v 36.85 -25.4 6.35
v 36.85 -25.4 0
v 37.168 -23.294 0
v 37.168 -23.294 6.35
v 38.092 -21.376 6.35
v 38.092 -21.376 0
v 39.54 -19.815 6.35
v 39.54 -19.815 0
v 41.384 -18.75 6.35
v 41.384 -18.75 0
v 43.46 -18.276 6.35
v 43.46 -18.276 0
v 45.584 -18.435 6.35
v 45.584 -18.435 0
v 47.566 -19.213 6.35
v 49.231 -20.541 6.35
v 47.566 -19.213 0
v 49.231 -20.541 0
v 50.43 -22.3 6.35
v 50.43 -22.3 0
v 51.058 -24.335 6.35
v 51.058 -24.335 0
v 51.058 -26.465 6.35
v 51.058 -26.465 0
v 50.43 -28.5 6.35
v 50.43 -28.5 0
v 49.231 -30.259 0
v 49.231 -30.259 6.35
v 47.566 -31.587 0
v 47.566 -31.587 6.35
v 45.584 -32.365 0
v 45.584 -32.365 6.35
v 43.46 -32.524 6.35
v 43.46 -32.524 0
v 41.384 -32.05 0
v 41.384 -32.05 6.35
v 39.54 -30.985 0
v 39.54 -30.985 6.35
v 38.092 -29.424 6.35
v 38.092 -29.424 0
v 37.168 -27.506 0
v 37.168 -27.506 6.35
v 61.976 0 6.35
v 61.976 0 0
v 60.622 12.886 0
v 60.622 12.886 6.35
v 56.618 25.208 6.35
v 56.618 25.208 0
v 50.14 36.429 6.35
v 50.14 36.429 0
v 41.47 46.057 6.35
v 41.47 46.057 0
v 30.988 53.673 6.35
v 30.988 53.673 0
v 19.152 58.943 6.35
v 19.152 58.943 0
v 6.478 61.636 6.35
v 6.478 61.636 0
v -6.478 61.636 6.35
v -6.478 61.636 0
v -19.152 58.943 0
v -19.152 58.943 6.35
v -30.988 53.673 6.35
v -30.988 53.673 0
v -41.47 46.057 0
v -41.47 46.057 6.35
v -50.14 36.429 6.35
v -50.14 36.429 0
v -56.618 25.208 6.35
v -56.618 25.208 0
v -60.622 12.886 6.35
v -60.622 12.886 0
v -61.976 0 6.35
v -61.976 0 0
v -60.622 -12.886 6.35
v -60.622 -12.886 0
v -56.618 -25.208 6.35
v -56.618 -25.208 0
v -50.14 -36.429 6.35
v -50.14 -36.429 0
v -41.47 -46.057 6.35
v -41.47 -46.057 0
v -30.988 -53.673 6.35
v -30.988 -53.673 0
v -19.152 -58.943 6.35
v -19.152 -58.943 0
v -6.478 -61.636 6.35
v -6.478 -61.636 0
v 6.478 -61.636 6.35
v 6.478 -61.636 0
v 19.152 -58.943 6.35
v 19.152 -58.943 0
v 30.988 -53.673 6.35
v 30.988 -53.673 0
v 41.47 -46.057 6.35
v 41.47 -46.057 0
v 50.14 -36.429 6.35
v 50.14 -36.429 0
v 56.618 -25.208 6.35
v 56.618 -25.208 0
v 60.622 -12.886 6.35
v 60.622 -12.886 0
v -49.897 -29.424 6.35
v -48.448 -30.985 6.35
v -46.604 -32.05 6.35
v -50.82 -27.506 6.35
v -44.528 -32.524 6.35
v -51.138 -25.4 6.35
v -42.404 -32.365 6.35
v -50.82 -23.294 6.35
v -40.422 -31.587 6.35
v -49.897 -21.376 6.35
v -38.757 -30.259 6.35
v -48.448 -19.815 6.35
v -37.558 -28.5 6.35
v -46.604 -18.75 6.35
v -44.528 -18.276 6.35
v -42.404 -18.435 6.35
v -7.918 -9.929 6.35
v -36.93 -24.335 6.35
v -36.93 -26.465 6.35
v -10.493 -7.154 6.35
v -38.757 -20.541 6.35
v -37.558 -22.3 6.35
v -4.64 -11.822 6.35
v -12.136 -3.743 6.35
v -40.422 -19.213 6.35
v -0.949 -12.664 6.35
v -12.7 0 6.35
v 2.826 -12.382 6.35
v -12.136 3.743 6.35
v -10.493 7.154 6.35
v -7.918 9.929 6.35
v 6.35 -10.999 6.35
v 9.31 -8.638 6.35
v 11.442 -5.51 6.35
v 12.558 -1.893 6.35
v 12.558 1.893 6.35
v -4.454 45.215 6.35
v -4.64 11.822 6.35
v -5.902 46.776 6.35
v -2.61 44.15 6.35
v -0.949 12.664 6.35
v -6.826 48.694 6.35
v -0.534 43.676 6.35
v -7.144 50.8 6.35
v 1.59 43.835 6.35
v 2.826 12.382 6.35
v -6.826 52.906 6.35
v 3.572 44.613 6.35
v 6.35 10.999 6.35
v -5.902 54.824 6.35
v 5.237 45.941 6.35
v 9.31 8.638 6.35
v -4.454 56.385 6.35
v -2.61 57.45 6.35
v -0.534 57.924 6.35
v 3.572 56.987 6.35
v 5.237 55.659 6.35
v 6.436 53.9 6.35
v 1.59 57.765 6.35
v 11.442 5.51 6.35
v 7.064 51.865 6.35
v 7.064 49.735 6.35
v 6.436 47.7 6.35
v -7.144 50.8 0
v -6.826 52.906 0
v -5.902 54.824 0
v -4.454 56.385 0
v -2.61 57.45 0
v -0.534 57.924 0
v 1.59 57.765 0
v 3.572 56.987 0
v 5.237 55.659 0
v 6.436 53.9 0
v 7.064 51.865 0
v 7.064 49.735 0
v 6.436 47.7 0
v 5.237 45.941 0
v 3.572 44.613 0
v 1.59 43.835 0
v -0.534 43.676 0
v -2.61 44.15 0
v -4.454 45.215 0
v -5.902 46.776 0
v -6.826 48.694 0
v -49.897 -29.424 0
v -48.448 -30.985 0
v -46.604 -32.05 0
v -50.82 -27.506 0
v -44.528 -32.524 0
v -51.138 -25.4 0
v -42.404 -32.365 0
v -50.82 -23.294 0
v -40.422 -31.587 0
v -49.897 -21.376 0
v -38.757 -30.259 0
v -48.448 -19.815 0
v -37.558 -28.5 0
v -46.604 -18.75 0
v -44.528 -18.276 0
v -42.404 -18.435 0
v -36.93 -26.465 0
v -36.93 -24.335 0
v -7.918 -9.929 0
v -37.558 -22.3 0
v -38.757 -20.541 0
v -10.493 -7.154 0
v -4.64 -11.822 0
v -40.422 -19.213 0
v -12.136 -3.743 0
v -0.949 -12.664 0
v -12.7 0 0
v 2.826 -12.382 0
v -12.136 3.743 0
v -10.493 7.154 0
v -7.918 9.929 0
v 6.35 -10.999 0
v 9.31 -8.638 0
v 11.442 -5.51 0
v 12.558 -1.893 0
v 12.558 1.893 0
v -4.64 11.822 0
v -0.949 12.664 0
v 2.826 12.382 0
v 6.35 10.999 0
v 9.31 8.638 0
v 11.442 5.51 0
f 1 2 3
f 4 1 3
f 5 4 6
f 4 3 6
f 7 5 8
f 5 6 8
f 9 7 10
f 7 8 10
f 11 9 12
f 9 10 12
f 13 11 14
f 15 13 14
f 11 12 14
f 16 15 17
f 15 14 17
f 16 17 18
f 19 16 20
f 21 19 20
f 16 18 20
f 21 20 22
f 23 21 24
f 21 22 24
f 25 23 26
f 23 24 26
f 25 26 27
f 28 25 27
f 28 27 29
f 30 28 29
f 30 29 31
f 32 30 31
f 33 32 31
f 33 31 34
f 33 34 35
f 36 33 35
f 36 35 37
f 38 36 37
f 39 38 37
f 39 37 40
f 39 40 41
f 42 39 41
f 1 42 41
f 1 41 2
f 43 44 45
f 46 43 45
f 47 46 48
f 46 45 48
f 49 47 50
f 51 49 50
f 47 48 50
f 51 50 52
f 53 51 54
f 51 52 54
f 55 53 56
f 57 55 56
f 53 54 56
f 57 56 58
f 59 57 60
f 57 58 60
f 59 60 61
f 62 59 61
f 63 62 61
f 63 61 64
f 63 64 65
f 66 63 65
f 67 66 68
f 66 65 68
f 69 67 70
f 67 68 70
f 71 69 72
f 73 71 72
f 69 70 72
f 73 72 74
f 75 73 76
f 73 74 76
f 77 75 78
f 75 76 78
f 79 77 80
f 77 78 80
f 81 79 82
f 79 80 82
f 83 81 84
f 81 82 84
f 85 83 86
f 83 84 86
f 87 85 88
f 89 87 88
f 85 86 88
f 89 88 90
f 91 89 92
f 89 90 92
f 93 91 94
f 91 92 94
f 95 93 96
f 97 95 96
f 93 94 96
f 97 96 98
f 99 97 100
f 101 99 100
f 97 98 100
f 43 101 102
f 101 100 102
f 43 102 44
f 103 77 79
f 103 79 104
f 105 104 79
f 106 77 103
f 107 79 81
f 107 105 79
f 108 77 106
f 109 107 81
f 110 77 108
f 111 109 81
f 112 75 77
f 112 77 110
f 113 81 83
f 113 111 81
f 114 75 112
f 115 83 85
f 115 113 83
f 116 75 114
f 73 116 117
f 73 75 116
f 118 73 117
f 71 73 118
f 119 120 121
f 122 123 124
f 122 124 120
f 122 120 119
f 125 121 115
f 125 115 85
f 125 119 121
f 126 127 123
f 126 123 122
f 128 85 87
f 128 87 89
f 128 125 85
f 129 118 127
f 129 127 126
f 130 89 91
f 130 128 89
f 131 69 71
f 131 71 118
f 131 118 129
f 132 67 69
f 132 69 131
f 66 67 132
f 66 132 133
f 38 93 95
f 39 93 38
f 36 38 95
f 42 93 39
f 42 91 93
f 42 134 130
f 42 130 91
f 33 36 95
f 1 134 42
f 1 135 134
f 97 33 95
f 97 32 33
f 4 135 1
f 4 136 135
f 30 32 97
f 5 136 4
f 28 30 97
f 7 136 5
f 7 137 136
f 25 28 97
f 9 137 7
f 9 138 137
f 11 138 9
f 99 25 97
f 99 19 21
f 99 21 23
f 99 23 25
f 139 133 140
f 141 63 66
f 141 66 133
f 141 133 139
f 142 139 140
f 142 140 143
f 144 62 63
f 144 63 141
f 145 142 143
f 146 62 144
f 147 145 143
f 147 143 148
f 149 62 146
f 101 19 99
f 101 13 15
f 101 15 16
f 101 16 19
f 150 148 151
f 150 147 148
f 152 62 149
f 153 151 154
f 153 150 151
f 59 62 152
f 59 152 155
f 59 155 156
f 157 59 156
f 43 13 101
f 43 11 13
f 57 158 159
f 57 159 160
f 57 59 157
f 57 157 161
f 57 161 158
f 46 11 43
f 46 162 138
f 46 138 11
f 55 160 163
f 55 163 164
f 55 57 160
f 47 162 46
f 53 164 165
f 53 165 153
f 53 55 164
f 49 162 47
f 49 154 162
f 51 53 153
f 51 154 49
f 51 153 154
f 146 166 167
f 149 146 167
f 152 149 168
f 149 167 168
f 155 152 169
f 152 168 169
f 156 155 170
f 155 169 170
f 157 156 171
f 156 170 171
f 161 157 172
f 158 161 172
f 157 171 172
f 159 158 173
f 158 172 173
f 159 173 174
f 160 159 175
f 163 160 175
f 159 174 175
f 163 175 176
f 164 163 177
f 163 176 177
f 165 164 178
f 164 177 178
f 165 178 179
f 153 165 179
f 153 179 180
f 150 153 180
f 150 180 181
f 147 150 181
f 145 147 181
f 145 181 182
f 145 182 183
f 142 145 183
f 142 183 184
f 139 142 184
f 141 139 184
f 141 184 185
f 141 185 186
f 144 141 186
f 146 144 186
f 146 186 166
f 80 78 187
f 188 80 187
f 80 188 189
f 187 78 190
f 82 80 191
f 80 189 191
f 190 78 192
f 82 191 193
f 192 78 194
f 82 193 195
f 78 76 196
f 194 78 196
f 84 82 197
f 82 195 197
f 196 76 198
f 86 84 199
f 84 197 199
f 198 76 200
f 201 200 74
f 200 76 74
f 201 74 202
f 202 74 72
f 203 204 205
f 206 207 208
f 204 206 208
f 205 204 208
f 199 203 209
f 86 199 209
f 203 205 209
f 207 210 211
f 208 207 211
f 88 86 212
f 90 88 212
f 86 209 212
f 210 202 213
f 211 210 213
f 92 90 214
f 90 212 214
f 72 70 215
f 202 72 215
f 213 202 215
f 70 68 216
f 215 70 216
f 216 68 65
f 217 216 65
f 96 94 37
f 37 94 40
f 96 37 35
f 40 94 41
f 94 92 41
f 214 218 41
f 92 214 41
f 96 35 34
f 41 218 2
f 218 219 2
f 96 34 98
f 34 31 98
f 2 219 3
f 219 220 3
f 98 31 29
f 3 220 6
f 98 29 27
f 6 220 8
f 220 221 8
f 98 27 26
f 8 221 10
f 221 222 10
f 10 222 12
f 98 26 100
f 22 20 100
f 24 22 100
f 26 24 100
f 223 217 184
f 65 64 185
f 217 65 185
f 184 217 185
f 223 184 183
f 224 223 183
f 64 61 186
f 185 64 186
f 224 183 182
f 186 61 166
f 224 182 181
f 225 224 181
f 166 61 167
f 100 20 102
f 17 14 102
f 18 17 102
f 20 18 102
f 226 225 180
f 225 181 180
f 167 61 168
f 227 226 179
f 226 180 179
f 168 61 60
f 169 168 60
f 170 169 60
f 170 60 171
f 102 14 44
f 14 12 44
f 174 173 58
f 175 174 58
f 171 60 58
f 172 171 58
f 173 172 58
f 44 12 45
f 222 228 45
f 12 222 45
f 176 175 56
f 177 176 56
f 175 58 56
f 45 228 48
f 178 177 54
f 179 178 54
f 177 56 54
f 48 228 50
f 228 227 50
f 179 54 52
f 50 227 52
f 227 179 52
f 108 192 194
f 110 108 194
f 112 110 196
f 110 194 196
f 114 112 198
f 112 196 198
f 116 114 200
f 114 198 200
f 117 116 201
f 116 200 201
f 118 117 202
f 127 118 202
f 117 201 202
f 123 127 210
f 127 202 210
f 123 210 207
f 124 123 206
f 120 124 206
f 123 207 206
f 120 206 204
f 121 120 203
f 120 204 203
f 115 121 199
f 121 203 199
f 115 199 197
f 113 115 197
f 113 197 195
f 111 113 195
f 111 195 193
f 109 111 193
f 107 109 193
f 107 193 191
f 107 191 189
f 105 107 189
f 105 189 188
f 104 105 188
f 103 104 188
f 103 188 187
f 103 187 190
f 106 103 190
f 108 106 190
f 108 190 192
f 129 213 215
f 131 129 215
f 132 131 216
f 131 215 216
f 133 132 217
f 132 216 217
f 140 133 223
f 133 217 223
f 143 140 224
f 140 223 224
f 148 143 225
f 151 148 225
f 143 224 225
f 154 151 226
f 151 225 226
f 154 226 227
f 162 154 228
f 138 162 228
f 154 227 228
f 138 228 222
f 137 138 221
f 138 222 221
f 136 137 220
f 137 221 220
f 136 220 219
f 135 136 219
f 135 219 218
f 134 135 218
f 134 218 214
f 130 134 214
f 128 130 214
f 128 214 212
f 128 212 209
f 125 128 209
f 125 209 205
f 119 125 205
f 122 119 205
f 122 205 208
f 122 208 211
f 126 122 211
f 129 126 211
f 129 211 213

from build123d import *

# Parameters (mm, degrees)
SKETCH1_R                      = 61.976
BOSS_EXTRUDE1_DEPTH            = 6.35
F_1_1_DIAMETER_HOLE1_D         = 25.4
F_9_16_0_5625_DIAMETER_HOLE1_D = 14.2875


with BuildPart() as part:
    # Sketch1 → Boss-Extrude1 (new body)
    with BuildSketch(Plane.XY):
        Circle(SKETCH1_R)
    extrude(amount=BOSS_EXTRUDE1_DEPTH)

    # 1 (1) Diameter Hole1 (through all)
    with Locations(Plane.XY.offset(6.35)):
        with Locations((0, 0)):
            Hole(F_1_1_DIAMETER_HOLE1_D / 2)

    # 9/16 (0.5625) Diameter Hole1 (through all)
    with Locations(Plane.XY.offset(6.35)):
        with Locations((-43.994090512, -25.4), (43.994090512, -25.4), (0, 50.8)):
            Hole(F_9_16_0_5625_DIAMETER_HOLE1_D / 2)


solid = part.part
